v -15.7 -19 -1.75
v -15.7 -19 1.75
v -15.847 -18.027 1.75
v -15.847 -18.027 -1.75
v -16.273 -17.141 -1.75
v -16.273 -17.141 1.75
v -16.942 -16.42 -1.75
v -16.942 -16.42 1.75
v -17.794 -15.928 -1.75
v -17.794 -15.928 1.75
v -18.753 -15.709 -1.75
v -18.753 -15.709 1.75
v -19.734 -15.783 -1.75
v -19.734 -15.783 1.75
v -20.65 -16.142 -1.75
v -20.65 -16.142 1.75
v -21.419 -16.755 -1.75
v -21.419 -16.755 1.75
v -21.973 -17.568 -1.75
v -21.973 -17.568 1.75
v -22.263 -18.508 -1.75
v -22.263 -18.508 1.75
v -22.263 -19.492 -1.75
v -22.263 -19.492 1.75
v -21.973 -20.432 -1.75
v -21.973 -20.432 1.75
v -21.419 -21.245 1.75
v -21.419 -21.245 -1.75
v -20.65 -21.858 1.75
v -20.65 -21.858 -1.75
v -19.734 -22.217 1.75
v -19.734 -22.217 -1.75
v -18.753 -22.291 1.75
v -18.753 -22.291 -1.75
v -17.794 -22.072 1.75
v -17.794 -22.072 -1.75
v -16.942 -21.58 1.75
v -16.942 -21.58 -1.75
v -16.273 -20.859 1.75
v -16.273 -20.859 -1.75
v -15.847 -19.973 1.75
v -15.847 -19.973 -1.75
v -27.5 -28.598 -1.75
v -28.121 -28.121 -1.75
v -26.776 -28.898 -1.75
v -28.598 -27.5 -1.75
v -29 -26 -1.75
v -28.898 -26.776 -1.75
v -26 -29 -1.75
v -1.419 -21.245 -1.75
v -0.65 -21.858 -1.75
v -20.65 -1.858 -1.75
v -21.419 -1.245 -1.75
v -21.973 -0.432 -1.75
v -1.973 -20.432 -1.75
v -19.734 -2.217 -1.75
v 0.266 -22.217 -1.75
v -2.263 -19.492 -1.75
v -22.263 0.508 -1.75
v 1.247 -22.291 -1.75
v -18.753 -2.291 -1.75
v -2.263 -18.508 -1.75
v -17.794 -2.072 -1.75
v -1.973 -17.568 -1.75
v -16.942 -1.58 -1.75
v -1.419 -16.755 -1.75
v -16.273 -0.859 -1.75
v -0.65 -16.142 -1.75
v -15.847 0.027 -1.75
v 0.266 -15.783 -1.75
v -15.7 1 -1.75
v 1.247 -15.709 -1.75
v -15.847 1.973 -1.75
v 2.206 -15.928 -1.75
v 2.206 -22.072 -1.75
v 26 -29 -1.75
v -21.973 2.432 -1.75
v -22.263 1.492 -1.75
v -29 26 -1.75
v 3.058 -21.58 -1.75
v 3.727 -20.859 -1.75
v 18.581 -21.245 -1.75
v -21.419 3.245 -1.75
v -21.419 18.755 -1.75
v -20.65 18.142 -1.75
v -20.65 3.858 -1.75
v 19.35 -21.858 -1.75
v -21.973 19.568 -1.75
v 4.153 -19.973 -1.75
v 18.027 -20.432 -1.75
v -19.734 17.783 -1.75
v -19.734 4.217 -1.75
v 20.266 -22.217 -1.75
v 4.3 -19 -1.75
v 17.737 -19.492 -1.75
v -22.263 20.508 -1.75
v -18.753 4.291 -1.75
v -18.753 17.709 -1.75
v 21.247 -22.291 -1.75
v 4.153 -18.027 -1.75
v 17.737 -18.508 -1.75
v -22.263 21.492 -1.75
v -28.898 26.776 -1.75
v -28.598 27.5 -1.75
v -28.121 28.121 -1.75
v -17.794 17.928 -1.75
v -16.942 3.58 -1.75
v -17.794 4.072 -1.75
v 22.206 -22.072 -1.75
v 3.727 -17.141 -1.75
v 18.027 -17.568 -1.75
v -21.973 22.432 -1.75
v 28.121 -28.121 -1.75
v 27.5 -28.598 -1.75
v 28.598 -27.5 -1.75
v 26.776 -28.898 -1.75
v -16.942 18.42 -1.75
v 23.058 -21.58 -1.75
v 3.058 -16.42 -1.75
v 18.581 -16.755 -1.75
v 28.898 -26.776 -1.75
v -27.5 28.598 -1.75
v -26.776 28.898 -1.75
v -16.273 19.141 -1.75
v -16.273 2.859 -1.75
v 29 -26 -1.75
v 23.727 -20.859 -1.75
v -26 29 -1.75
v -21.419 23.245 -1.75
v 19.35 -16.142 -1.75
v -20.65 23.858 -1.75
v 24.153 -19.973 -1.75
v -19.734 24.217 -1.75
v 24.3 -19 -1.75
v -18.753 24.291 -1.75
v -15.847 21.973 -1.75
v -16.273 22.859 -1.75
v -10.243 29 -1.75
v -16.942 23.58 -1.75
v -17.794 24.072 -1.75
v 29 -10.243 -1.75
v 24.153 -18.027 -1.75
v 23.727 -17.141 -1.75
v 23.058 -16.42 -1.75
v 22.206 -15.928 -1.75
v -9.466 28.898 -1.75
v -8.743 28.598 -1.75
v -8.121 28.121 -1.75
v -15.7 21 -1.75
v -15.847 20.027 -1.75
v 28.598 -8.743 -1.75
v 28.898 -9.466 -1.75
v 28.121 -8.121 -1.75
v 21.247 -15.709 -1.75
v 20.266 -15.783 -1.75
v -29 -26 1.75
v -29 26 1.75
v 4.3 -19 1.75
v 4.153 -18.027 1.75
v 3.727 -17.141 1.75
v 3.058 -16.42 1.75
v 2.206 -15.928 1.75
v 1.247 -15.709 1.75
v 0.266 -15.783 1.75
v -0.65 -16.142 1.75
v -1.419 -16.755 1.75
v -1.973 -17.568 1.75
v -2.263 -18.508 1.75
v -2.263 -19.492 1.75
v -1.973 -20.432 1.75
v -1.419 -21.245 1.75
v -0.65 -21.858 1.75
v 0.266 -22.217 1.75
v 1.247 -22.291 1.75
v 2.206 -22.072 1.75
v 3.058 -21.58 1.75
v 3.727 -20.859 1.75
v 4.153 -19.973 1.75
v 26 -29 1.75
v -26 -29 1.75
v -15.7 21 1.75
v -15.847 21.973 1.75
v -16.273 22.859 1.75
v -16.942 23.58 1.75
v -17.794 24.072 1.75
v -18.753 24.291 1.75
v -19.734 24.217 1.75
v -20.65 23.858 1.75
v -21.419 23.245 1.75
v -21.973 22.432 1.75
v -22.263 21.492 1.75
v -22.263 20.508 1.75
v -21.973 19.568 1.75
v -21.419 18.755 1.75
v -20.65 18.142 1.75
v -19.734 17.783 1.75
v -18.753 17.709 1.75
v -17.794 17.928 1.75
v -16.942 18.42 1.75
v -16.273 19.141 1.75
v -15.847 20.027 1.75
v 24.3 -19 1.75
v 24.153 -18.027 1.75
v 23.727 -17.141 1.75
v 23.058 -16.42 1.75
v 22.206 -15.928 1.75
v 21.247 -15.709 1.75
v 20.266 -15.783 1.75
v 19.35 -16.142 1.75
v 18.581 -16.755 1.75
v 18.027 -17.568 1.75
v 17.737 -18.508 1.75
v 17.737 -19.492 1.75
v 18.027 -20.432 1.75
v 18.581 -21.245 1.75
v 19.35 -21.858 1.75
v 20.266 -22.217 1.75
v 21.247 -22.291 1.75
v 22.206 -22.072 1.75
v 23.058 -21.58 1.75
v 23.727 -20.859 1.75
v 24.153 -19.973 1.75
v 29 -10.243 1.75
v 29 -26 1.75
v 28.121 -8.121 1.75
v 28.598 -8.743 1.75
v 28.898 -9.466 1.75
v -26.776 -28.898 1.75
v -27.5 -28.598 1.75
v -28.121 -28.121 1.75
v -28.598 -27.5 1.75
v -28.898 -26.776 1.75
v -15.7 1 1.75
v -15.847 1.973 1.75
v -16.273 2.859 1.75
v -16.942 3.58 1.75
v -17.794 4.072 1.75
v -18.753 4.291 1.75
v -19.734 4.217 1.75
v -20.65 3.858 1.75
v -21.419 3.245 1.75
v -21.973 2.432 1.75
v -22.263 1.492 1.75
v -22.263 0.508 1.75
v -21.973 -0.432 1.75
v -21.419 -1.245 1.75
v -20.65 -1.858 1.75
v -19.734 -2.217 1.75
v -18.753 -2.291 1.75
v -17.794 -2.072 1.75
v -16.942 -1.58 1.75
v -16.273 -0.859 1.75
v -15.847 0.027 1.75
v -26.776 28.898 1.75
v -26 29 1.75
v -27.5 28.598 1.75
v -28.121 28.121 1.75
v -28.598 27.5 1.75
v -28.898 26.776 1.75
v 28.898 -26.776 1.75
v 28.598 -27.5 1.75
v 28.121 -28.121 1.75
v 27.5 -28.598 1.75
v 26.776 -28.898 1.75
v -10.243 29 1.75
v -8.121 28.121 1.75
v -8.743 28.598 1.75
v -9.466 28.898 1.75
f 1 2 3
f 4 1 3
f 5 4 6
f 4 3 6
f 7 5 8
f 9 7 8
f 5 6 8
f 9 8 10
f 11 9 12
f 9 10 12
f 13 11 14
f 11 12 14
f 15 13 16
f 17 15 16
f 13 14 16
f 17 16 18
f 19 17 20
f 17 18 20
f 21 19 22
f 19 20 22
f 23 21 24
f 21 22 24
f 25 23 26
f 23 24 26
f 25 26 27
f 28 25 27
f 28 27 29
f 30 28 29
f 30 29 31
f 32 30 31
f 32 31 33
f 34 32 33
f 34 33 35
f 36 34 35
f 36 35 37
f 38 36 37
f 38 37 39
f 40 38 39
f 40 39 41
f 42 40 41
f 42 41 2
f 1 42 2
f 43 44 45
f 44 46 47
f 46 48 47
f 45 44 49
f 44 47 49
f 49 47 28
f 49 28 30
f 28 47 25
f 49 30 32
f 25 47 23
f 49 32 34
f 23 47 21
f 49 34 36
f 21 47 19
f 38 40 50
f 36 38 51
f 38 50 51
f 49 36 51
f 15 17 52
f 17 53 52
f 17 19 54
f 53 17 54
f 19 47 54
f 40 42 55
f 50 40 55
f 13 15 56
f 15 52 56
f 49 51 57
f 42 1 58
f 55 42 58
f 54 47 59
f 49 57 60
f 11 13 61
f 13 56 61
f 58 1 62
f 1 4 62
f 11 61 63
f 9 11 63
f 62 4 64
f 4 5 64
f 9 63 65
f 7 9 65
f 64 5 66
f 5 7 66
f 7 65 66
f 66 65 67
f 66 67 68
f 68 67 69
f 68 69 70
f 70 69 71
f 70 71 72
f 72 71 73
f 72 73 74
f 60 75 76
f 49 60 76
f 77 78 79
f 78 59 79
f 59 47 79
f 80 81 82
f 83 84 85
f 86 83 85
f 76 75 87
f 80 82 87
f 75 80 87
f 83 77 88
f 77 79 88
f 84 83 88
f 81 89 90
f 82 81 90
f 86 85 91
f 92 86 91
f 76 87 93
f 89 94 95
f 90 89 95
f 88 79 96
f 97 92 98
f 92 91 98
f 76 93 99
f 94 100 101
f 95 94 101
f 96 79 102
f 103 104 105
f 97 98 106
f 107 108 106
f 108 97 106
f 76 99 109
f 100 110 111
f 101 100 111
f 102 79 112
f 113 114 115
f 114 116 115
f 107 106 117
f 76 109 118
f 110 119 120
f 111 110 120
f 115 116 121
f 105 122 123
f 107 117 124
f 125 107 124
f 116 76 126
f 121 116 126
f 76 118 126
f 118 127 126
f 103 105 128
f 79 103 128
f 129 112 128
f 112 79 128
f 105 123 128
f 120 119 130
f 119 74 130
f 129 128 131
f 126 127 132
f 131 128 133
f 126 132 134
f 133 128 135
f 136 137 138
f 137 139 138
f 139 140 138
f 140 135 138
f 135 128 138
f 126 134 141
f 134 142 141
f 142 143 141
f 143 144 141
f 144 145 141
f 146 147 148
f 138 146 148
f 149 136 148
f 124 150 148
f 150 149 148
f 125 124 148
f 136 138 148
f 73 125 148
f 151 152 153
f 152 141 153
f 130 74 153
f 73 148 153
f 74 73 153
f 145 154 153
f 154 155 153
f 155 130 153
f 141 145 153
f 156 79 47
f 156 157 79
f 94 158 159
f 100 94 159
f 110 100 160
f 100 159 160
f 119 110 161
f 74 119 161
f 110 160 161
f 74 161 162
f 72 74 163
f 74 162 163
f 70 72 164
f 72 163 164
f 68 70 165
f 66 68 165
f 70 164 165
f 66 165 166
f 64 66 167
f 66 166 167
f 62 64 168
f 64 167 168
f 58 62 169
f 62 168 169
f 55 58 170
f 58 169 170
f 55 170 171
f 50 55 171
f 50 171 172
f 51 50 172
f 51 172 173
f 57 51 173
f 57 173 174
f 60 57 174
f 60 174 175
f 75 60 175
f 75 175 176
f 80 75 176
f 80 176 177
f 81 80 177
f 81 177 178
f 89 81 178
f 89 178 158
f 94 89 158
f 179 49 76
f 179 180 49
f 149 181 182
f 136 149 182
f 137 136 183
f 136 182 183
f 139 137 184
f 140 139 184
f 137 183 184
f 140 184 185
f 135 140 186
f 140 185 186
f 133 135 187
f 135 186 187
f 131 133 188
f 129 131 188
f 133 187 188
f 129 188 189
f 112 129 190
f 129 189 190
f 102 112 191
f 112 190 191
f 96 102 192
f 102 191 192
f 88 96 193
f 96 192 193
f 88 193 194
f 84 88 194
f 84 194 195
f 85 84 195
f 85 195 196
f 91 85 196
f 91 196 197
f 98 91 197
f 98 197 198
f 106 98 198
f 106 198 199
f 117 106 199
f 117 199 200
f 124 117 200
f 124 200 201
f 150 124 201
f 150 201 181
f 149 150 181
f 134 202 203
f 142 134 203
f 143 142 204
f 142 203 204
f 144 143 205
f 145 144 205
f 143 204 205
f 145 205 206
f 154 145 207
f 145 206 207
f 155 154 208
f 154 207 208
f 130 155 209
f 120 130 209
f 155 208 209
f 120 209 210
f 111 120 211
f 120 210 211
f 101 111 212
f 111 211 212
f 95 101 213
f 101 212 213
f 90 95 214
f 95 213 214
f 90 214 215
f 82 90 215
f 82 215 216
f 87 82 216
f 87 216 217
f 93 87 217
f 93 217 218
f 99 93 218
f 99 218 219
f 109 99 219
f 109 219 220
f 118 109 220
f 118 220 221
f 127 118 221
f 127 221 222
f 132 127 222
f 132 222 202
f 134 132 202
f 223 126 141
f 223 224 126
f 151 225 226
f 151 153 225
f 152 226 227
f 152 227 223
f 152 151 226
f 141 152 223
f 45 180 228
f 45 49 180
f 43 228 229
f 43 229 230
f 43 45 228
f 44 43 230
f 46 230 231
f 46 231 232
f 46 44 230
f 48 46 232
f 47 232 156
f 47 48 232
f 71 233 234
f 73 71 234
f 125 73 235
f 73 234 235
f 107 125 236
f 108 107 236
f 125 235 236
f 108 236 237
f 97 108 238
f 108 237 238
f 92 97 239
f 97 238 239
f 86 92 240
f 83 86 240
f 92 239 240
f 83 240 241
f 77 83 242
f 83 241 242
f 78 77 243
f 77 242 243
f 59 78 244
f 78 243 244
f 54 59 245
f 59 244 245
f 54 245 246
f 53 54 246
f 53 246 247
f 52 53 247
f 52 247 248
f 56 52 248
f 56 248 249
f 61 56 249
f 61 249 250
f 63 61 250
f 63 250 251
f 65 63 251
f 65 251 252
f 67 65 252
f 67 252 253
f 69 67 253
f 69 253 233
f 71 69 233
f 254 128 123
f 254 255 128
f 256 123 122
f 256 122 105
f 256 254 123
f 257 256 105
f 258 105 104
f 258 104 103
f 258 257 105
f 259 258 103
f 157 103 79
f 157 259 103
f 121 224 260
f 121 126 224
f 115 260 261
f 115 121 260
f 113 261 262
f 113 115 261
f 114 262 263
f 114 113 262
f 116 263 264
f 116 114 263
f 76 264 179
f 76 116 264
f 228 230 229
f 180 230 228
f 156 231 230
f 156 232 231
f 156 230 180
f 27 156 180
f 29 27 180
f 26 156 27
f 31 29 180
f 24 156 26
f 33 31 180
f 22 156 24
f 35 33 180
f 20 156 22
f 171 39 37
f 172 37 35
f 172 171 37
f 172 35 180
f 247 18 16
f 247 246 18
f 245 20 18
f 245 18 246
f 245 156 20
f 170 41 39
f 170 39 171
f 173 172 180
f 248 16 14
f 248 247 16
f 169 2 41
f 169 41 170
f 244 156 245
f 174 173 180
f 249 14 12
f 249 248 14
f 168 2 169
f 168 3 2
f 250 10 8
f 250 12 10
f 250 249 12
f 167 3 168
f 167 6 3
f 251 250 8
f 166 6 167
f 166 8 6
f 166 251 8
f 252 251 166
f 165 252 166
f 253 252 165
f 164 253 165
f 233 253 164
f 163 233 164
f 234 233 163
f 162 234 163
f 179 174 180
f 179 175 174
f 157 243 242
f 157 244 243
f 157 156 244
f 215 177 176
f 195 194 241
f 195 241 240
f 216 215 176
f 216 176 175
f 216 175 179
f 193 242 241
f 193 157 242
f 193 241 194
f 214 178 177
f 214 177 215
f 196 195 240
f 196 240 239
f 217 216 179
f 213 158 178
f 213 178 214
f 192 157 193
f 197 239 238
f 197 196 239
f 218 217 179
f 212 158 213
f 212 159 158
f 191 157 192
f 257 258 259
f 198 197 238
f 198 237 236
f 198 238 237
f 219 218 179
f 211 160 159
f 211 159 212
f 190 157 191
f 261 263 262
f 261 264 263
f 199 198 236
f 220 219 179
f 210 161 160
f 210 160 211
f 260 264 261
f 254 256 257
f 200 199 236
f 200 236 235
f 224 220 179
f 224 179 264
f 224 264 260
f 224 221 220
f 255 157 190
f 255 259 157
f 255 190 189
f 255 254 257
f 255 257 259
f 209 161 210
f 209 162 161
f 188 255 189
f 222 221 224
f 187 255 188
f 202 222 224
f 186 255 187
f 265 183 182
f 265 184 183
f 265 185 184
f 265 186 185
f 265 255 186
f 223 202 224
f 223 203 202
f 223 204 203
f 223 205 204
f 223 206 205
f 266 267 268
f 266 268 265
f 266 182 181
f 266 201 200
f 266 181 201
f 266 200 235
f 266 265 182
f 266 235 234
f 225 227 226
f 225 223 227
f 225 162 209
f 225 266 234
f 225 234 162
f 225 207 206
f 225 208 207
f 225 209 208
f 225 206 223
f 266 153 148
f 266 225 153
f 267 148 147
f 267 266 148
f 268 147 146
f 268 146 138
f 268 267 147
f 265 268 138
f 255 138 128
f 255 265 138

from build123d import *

# Parameters (mm, degrees)
RESSALTO_EXTRUS_O1_DEPTH = 1.75
ESBO_O2_R                = 3.3
CORTE_EXTRUS_O1_DEPTH    = 42.161268202
FILETE1_R                = 3


with BuildPart() as part:
    # Esboço1 → Ressalto-extrusão1 (new, symmetric)
    with BuildSketch(Plane.XY):
        Polygon((29, -9), (-9, 29), (-29, 29), (-29, -29), (29, -29), align=None)
    extrude(amount=RESSALTO_EXTRUS_O1_DEPTH, both=True)

    # Esboço2 → Corte-extrusão1 (cut, through all)
    with BuildSketch(Plane.XY.offset(1.75)):
        with Locations((-19, -19)):
            Circle(ESBO_O2_R)
        with Locations((1, -19)):
            Circle(ESBO_O2_R)
        with Locations((21, -19)):
            Circle(ESBO_O2_R)
        with Locations((-19, 1)):
            Circle(ESBO_O2_R)
        with Locations((-19, 21)):
            Circle(ESBO_O2_R)
    extrude(amount=-CORTE_EXTRUS_O1_DEPTH, mode=Mode.SUBTRACT)

    # Filete1
    filete1_edges = [part.edges().sort_by_distance(p)[0] for p in [
        (29, -29, 0),
        (-29, -29, 0),
        (-29, 29, 0),
        (-9, 29, 0),
        (29, -9, 0),
    ]]
    fillet(filete1_edges, radius=FILETE1_R)


solid = part.part
